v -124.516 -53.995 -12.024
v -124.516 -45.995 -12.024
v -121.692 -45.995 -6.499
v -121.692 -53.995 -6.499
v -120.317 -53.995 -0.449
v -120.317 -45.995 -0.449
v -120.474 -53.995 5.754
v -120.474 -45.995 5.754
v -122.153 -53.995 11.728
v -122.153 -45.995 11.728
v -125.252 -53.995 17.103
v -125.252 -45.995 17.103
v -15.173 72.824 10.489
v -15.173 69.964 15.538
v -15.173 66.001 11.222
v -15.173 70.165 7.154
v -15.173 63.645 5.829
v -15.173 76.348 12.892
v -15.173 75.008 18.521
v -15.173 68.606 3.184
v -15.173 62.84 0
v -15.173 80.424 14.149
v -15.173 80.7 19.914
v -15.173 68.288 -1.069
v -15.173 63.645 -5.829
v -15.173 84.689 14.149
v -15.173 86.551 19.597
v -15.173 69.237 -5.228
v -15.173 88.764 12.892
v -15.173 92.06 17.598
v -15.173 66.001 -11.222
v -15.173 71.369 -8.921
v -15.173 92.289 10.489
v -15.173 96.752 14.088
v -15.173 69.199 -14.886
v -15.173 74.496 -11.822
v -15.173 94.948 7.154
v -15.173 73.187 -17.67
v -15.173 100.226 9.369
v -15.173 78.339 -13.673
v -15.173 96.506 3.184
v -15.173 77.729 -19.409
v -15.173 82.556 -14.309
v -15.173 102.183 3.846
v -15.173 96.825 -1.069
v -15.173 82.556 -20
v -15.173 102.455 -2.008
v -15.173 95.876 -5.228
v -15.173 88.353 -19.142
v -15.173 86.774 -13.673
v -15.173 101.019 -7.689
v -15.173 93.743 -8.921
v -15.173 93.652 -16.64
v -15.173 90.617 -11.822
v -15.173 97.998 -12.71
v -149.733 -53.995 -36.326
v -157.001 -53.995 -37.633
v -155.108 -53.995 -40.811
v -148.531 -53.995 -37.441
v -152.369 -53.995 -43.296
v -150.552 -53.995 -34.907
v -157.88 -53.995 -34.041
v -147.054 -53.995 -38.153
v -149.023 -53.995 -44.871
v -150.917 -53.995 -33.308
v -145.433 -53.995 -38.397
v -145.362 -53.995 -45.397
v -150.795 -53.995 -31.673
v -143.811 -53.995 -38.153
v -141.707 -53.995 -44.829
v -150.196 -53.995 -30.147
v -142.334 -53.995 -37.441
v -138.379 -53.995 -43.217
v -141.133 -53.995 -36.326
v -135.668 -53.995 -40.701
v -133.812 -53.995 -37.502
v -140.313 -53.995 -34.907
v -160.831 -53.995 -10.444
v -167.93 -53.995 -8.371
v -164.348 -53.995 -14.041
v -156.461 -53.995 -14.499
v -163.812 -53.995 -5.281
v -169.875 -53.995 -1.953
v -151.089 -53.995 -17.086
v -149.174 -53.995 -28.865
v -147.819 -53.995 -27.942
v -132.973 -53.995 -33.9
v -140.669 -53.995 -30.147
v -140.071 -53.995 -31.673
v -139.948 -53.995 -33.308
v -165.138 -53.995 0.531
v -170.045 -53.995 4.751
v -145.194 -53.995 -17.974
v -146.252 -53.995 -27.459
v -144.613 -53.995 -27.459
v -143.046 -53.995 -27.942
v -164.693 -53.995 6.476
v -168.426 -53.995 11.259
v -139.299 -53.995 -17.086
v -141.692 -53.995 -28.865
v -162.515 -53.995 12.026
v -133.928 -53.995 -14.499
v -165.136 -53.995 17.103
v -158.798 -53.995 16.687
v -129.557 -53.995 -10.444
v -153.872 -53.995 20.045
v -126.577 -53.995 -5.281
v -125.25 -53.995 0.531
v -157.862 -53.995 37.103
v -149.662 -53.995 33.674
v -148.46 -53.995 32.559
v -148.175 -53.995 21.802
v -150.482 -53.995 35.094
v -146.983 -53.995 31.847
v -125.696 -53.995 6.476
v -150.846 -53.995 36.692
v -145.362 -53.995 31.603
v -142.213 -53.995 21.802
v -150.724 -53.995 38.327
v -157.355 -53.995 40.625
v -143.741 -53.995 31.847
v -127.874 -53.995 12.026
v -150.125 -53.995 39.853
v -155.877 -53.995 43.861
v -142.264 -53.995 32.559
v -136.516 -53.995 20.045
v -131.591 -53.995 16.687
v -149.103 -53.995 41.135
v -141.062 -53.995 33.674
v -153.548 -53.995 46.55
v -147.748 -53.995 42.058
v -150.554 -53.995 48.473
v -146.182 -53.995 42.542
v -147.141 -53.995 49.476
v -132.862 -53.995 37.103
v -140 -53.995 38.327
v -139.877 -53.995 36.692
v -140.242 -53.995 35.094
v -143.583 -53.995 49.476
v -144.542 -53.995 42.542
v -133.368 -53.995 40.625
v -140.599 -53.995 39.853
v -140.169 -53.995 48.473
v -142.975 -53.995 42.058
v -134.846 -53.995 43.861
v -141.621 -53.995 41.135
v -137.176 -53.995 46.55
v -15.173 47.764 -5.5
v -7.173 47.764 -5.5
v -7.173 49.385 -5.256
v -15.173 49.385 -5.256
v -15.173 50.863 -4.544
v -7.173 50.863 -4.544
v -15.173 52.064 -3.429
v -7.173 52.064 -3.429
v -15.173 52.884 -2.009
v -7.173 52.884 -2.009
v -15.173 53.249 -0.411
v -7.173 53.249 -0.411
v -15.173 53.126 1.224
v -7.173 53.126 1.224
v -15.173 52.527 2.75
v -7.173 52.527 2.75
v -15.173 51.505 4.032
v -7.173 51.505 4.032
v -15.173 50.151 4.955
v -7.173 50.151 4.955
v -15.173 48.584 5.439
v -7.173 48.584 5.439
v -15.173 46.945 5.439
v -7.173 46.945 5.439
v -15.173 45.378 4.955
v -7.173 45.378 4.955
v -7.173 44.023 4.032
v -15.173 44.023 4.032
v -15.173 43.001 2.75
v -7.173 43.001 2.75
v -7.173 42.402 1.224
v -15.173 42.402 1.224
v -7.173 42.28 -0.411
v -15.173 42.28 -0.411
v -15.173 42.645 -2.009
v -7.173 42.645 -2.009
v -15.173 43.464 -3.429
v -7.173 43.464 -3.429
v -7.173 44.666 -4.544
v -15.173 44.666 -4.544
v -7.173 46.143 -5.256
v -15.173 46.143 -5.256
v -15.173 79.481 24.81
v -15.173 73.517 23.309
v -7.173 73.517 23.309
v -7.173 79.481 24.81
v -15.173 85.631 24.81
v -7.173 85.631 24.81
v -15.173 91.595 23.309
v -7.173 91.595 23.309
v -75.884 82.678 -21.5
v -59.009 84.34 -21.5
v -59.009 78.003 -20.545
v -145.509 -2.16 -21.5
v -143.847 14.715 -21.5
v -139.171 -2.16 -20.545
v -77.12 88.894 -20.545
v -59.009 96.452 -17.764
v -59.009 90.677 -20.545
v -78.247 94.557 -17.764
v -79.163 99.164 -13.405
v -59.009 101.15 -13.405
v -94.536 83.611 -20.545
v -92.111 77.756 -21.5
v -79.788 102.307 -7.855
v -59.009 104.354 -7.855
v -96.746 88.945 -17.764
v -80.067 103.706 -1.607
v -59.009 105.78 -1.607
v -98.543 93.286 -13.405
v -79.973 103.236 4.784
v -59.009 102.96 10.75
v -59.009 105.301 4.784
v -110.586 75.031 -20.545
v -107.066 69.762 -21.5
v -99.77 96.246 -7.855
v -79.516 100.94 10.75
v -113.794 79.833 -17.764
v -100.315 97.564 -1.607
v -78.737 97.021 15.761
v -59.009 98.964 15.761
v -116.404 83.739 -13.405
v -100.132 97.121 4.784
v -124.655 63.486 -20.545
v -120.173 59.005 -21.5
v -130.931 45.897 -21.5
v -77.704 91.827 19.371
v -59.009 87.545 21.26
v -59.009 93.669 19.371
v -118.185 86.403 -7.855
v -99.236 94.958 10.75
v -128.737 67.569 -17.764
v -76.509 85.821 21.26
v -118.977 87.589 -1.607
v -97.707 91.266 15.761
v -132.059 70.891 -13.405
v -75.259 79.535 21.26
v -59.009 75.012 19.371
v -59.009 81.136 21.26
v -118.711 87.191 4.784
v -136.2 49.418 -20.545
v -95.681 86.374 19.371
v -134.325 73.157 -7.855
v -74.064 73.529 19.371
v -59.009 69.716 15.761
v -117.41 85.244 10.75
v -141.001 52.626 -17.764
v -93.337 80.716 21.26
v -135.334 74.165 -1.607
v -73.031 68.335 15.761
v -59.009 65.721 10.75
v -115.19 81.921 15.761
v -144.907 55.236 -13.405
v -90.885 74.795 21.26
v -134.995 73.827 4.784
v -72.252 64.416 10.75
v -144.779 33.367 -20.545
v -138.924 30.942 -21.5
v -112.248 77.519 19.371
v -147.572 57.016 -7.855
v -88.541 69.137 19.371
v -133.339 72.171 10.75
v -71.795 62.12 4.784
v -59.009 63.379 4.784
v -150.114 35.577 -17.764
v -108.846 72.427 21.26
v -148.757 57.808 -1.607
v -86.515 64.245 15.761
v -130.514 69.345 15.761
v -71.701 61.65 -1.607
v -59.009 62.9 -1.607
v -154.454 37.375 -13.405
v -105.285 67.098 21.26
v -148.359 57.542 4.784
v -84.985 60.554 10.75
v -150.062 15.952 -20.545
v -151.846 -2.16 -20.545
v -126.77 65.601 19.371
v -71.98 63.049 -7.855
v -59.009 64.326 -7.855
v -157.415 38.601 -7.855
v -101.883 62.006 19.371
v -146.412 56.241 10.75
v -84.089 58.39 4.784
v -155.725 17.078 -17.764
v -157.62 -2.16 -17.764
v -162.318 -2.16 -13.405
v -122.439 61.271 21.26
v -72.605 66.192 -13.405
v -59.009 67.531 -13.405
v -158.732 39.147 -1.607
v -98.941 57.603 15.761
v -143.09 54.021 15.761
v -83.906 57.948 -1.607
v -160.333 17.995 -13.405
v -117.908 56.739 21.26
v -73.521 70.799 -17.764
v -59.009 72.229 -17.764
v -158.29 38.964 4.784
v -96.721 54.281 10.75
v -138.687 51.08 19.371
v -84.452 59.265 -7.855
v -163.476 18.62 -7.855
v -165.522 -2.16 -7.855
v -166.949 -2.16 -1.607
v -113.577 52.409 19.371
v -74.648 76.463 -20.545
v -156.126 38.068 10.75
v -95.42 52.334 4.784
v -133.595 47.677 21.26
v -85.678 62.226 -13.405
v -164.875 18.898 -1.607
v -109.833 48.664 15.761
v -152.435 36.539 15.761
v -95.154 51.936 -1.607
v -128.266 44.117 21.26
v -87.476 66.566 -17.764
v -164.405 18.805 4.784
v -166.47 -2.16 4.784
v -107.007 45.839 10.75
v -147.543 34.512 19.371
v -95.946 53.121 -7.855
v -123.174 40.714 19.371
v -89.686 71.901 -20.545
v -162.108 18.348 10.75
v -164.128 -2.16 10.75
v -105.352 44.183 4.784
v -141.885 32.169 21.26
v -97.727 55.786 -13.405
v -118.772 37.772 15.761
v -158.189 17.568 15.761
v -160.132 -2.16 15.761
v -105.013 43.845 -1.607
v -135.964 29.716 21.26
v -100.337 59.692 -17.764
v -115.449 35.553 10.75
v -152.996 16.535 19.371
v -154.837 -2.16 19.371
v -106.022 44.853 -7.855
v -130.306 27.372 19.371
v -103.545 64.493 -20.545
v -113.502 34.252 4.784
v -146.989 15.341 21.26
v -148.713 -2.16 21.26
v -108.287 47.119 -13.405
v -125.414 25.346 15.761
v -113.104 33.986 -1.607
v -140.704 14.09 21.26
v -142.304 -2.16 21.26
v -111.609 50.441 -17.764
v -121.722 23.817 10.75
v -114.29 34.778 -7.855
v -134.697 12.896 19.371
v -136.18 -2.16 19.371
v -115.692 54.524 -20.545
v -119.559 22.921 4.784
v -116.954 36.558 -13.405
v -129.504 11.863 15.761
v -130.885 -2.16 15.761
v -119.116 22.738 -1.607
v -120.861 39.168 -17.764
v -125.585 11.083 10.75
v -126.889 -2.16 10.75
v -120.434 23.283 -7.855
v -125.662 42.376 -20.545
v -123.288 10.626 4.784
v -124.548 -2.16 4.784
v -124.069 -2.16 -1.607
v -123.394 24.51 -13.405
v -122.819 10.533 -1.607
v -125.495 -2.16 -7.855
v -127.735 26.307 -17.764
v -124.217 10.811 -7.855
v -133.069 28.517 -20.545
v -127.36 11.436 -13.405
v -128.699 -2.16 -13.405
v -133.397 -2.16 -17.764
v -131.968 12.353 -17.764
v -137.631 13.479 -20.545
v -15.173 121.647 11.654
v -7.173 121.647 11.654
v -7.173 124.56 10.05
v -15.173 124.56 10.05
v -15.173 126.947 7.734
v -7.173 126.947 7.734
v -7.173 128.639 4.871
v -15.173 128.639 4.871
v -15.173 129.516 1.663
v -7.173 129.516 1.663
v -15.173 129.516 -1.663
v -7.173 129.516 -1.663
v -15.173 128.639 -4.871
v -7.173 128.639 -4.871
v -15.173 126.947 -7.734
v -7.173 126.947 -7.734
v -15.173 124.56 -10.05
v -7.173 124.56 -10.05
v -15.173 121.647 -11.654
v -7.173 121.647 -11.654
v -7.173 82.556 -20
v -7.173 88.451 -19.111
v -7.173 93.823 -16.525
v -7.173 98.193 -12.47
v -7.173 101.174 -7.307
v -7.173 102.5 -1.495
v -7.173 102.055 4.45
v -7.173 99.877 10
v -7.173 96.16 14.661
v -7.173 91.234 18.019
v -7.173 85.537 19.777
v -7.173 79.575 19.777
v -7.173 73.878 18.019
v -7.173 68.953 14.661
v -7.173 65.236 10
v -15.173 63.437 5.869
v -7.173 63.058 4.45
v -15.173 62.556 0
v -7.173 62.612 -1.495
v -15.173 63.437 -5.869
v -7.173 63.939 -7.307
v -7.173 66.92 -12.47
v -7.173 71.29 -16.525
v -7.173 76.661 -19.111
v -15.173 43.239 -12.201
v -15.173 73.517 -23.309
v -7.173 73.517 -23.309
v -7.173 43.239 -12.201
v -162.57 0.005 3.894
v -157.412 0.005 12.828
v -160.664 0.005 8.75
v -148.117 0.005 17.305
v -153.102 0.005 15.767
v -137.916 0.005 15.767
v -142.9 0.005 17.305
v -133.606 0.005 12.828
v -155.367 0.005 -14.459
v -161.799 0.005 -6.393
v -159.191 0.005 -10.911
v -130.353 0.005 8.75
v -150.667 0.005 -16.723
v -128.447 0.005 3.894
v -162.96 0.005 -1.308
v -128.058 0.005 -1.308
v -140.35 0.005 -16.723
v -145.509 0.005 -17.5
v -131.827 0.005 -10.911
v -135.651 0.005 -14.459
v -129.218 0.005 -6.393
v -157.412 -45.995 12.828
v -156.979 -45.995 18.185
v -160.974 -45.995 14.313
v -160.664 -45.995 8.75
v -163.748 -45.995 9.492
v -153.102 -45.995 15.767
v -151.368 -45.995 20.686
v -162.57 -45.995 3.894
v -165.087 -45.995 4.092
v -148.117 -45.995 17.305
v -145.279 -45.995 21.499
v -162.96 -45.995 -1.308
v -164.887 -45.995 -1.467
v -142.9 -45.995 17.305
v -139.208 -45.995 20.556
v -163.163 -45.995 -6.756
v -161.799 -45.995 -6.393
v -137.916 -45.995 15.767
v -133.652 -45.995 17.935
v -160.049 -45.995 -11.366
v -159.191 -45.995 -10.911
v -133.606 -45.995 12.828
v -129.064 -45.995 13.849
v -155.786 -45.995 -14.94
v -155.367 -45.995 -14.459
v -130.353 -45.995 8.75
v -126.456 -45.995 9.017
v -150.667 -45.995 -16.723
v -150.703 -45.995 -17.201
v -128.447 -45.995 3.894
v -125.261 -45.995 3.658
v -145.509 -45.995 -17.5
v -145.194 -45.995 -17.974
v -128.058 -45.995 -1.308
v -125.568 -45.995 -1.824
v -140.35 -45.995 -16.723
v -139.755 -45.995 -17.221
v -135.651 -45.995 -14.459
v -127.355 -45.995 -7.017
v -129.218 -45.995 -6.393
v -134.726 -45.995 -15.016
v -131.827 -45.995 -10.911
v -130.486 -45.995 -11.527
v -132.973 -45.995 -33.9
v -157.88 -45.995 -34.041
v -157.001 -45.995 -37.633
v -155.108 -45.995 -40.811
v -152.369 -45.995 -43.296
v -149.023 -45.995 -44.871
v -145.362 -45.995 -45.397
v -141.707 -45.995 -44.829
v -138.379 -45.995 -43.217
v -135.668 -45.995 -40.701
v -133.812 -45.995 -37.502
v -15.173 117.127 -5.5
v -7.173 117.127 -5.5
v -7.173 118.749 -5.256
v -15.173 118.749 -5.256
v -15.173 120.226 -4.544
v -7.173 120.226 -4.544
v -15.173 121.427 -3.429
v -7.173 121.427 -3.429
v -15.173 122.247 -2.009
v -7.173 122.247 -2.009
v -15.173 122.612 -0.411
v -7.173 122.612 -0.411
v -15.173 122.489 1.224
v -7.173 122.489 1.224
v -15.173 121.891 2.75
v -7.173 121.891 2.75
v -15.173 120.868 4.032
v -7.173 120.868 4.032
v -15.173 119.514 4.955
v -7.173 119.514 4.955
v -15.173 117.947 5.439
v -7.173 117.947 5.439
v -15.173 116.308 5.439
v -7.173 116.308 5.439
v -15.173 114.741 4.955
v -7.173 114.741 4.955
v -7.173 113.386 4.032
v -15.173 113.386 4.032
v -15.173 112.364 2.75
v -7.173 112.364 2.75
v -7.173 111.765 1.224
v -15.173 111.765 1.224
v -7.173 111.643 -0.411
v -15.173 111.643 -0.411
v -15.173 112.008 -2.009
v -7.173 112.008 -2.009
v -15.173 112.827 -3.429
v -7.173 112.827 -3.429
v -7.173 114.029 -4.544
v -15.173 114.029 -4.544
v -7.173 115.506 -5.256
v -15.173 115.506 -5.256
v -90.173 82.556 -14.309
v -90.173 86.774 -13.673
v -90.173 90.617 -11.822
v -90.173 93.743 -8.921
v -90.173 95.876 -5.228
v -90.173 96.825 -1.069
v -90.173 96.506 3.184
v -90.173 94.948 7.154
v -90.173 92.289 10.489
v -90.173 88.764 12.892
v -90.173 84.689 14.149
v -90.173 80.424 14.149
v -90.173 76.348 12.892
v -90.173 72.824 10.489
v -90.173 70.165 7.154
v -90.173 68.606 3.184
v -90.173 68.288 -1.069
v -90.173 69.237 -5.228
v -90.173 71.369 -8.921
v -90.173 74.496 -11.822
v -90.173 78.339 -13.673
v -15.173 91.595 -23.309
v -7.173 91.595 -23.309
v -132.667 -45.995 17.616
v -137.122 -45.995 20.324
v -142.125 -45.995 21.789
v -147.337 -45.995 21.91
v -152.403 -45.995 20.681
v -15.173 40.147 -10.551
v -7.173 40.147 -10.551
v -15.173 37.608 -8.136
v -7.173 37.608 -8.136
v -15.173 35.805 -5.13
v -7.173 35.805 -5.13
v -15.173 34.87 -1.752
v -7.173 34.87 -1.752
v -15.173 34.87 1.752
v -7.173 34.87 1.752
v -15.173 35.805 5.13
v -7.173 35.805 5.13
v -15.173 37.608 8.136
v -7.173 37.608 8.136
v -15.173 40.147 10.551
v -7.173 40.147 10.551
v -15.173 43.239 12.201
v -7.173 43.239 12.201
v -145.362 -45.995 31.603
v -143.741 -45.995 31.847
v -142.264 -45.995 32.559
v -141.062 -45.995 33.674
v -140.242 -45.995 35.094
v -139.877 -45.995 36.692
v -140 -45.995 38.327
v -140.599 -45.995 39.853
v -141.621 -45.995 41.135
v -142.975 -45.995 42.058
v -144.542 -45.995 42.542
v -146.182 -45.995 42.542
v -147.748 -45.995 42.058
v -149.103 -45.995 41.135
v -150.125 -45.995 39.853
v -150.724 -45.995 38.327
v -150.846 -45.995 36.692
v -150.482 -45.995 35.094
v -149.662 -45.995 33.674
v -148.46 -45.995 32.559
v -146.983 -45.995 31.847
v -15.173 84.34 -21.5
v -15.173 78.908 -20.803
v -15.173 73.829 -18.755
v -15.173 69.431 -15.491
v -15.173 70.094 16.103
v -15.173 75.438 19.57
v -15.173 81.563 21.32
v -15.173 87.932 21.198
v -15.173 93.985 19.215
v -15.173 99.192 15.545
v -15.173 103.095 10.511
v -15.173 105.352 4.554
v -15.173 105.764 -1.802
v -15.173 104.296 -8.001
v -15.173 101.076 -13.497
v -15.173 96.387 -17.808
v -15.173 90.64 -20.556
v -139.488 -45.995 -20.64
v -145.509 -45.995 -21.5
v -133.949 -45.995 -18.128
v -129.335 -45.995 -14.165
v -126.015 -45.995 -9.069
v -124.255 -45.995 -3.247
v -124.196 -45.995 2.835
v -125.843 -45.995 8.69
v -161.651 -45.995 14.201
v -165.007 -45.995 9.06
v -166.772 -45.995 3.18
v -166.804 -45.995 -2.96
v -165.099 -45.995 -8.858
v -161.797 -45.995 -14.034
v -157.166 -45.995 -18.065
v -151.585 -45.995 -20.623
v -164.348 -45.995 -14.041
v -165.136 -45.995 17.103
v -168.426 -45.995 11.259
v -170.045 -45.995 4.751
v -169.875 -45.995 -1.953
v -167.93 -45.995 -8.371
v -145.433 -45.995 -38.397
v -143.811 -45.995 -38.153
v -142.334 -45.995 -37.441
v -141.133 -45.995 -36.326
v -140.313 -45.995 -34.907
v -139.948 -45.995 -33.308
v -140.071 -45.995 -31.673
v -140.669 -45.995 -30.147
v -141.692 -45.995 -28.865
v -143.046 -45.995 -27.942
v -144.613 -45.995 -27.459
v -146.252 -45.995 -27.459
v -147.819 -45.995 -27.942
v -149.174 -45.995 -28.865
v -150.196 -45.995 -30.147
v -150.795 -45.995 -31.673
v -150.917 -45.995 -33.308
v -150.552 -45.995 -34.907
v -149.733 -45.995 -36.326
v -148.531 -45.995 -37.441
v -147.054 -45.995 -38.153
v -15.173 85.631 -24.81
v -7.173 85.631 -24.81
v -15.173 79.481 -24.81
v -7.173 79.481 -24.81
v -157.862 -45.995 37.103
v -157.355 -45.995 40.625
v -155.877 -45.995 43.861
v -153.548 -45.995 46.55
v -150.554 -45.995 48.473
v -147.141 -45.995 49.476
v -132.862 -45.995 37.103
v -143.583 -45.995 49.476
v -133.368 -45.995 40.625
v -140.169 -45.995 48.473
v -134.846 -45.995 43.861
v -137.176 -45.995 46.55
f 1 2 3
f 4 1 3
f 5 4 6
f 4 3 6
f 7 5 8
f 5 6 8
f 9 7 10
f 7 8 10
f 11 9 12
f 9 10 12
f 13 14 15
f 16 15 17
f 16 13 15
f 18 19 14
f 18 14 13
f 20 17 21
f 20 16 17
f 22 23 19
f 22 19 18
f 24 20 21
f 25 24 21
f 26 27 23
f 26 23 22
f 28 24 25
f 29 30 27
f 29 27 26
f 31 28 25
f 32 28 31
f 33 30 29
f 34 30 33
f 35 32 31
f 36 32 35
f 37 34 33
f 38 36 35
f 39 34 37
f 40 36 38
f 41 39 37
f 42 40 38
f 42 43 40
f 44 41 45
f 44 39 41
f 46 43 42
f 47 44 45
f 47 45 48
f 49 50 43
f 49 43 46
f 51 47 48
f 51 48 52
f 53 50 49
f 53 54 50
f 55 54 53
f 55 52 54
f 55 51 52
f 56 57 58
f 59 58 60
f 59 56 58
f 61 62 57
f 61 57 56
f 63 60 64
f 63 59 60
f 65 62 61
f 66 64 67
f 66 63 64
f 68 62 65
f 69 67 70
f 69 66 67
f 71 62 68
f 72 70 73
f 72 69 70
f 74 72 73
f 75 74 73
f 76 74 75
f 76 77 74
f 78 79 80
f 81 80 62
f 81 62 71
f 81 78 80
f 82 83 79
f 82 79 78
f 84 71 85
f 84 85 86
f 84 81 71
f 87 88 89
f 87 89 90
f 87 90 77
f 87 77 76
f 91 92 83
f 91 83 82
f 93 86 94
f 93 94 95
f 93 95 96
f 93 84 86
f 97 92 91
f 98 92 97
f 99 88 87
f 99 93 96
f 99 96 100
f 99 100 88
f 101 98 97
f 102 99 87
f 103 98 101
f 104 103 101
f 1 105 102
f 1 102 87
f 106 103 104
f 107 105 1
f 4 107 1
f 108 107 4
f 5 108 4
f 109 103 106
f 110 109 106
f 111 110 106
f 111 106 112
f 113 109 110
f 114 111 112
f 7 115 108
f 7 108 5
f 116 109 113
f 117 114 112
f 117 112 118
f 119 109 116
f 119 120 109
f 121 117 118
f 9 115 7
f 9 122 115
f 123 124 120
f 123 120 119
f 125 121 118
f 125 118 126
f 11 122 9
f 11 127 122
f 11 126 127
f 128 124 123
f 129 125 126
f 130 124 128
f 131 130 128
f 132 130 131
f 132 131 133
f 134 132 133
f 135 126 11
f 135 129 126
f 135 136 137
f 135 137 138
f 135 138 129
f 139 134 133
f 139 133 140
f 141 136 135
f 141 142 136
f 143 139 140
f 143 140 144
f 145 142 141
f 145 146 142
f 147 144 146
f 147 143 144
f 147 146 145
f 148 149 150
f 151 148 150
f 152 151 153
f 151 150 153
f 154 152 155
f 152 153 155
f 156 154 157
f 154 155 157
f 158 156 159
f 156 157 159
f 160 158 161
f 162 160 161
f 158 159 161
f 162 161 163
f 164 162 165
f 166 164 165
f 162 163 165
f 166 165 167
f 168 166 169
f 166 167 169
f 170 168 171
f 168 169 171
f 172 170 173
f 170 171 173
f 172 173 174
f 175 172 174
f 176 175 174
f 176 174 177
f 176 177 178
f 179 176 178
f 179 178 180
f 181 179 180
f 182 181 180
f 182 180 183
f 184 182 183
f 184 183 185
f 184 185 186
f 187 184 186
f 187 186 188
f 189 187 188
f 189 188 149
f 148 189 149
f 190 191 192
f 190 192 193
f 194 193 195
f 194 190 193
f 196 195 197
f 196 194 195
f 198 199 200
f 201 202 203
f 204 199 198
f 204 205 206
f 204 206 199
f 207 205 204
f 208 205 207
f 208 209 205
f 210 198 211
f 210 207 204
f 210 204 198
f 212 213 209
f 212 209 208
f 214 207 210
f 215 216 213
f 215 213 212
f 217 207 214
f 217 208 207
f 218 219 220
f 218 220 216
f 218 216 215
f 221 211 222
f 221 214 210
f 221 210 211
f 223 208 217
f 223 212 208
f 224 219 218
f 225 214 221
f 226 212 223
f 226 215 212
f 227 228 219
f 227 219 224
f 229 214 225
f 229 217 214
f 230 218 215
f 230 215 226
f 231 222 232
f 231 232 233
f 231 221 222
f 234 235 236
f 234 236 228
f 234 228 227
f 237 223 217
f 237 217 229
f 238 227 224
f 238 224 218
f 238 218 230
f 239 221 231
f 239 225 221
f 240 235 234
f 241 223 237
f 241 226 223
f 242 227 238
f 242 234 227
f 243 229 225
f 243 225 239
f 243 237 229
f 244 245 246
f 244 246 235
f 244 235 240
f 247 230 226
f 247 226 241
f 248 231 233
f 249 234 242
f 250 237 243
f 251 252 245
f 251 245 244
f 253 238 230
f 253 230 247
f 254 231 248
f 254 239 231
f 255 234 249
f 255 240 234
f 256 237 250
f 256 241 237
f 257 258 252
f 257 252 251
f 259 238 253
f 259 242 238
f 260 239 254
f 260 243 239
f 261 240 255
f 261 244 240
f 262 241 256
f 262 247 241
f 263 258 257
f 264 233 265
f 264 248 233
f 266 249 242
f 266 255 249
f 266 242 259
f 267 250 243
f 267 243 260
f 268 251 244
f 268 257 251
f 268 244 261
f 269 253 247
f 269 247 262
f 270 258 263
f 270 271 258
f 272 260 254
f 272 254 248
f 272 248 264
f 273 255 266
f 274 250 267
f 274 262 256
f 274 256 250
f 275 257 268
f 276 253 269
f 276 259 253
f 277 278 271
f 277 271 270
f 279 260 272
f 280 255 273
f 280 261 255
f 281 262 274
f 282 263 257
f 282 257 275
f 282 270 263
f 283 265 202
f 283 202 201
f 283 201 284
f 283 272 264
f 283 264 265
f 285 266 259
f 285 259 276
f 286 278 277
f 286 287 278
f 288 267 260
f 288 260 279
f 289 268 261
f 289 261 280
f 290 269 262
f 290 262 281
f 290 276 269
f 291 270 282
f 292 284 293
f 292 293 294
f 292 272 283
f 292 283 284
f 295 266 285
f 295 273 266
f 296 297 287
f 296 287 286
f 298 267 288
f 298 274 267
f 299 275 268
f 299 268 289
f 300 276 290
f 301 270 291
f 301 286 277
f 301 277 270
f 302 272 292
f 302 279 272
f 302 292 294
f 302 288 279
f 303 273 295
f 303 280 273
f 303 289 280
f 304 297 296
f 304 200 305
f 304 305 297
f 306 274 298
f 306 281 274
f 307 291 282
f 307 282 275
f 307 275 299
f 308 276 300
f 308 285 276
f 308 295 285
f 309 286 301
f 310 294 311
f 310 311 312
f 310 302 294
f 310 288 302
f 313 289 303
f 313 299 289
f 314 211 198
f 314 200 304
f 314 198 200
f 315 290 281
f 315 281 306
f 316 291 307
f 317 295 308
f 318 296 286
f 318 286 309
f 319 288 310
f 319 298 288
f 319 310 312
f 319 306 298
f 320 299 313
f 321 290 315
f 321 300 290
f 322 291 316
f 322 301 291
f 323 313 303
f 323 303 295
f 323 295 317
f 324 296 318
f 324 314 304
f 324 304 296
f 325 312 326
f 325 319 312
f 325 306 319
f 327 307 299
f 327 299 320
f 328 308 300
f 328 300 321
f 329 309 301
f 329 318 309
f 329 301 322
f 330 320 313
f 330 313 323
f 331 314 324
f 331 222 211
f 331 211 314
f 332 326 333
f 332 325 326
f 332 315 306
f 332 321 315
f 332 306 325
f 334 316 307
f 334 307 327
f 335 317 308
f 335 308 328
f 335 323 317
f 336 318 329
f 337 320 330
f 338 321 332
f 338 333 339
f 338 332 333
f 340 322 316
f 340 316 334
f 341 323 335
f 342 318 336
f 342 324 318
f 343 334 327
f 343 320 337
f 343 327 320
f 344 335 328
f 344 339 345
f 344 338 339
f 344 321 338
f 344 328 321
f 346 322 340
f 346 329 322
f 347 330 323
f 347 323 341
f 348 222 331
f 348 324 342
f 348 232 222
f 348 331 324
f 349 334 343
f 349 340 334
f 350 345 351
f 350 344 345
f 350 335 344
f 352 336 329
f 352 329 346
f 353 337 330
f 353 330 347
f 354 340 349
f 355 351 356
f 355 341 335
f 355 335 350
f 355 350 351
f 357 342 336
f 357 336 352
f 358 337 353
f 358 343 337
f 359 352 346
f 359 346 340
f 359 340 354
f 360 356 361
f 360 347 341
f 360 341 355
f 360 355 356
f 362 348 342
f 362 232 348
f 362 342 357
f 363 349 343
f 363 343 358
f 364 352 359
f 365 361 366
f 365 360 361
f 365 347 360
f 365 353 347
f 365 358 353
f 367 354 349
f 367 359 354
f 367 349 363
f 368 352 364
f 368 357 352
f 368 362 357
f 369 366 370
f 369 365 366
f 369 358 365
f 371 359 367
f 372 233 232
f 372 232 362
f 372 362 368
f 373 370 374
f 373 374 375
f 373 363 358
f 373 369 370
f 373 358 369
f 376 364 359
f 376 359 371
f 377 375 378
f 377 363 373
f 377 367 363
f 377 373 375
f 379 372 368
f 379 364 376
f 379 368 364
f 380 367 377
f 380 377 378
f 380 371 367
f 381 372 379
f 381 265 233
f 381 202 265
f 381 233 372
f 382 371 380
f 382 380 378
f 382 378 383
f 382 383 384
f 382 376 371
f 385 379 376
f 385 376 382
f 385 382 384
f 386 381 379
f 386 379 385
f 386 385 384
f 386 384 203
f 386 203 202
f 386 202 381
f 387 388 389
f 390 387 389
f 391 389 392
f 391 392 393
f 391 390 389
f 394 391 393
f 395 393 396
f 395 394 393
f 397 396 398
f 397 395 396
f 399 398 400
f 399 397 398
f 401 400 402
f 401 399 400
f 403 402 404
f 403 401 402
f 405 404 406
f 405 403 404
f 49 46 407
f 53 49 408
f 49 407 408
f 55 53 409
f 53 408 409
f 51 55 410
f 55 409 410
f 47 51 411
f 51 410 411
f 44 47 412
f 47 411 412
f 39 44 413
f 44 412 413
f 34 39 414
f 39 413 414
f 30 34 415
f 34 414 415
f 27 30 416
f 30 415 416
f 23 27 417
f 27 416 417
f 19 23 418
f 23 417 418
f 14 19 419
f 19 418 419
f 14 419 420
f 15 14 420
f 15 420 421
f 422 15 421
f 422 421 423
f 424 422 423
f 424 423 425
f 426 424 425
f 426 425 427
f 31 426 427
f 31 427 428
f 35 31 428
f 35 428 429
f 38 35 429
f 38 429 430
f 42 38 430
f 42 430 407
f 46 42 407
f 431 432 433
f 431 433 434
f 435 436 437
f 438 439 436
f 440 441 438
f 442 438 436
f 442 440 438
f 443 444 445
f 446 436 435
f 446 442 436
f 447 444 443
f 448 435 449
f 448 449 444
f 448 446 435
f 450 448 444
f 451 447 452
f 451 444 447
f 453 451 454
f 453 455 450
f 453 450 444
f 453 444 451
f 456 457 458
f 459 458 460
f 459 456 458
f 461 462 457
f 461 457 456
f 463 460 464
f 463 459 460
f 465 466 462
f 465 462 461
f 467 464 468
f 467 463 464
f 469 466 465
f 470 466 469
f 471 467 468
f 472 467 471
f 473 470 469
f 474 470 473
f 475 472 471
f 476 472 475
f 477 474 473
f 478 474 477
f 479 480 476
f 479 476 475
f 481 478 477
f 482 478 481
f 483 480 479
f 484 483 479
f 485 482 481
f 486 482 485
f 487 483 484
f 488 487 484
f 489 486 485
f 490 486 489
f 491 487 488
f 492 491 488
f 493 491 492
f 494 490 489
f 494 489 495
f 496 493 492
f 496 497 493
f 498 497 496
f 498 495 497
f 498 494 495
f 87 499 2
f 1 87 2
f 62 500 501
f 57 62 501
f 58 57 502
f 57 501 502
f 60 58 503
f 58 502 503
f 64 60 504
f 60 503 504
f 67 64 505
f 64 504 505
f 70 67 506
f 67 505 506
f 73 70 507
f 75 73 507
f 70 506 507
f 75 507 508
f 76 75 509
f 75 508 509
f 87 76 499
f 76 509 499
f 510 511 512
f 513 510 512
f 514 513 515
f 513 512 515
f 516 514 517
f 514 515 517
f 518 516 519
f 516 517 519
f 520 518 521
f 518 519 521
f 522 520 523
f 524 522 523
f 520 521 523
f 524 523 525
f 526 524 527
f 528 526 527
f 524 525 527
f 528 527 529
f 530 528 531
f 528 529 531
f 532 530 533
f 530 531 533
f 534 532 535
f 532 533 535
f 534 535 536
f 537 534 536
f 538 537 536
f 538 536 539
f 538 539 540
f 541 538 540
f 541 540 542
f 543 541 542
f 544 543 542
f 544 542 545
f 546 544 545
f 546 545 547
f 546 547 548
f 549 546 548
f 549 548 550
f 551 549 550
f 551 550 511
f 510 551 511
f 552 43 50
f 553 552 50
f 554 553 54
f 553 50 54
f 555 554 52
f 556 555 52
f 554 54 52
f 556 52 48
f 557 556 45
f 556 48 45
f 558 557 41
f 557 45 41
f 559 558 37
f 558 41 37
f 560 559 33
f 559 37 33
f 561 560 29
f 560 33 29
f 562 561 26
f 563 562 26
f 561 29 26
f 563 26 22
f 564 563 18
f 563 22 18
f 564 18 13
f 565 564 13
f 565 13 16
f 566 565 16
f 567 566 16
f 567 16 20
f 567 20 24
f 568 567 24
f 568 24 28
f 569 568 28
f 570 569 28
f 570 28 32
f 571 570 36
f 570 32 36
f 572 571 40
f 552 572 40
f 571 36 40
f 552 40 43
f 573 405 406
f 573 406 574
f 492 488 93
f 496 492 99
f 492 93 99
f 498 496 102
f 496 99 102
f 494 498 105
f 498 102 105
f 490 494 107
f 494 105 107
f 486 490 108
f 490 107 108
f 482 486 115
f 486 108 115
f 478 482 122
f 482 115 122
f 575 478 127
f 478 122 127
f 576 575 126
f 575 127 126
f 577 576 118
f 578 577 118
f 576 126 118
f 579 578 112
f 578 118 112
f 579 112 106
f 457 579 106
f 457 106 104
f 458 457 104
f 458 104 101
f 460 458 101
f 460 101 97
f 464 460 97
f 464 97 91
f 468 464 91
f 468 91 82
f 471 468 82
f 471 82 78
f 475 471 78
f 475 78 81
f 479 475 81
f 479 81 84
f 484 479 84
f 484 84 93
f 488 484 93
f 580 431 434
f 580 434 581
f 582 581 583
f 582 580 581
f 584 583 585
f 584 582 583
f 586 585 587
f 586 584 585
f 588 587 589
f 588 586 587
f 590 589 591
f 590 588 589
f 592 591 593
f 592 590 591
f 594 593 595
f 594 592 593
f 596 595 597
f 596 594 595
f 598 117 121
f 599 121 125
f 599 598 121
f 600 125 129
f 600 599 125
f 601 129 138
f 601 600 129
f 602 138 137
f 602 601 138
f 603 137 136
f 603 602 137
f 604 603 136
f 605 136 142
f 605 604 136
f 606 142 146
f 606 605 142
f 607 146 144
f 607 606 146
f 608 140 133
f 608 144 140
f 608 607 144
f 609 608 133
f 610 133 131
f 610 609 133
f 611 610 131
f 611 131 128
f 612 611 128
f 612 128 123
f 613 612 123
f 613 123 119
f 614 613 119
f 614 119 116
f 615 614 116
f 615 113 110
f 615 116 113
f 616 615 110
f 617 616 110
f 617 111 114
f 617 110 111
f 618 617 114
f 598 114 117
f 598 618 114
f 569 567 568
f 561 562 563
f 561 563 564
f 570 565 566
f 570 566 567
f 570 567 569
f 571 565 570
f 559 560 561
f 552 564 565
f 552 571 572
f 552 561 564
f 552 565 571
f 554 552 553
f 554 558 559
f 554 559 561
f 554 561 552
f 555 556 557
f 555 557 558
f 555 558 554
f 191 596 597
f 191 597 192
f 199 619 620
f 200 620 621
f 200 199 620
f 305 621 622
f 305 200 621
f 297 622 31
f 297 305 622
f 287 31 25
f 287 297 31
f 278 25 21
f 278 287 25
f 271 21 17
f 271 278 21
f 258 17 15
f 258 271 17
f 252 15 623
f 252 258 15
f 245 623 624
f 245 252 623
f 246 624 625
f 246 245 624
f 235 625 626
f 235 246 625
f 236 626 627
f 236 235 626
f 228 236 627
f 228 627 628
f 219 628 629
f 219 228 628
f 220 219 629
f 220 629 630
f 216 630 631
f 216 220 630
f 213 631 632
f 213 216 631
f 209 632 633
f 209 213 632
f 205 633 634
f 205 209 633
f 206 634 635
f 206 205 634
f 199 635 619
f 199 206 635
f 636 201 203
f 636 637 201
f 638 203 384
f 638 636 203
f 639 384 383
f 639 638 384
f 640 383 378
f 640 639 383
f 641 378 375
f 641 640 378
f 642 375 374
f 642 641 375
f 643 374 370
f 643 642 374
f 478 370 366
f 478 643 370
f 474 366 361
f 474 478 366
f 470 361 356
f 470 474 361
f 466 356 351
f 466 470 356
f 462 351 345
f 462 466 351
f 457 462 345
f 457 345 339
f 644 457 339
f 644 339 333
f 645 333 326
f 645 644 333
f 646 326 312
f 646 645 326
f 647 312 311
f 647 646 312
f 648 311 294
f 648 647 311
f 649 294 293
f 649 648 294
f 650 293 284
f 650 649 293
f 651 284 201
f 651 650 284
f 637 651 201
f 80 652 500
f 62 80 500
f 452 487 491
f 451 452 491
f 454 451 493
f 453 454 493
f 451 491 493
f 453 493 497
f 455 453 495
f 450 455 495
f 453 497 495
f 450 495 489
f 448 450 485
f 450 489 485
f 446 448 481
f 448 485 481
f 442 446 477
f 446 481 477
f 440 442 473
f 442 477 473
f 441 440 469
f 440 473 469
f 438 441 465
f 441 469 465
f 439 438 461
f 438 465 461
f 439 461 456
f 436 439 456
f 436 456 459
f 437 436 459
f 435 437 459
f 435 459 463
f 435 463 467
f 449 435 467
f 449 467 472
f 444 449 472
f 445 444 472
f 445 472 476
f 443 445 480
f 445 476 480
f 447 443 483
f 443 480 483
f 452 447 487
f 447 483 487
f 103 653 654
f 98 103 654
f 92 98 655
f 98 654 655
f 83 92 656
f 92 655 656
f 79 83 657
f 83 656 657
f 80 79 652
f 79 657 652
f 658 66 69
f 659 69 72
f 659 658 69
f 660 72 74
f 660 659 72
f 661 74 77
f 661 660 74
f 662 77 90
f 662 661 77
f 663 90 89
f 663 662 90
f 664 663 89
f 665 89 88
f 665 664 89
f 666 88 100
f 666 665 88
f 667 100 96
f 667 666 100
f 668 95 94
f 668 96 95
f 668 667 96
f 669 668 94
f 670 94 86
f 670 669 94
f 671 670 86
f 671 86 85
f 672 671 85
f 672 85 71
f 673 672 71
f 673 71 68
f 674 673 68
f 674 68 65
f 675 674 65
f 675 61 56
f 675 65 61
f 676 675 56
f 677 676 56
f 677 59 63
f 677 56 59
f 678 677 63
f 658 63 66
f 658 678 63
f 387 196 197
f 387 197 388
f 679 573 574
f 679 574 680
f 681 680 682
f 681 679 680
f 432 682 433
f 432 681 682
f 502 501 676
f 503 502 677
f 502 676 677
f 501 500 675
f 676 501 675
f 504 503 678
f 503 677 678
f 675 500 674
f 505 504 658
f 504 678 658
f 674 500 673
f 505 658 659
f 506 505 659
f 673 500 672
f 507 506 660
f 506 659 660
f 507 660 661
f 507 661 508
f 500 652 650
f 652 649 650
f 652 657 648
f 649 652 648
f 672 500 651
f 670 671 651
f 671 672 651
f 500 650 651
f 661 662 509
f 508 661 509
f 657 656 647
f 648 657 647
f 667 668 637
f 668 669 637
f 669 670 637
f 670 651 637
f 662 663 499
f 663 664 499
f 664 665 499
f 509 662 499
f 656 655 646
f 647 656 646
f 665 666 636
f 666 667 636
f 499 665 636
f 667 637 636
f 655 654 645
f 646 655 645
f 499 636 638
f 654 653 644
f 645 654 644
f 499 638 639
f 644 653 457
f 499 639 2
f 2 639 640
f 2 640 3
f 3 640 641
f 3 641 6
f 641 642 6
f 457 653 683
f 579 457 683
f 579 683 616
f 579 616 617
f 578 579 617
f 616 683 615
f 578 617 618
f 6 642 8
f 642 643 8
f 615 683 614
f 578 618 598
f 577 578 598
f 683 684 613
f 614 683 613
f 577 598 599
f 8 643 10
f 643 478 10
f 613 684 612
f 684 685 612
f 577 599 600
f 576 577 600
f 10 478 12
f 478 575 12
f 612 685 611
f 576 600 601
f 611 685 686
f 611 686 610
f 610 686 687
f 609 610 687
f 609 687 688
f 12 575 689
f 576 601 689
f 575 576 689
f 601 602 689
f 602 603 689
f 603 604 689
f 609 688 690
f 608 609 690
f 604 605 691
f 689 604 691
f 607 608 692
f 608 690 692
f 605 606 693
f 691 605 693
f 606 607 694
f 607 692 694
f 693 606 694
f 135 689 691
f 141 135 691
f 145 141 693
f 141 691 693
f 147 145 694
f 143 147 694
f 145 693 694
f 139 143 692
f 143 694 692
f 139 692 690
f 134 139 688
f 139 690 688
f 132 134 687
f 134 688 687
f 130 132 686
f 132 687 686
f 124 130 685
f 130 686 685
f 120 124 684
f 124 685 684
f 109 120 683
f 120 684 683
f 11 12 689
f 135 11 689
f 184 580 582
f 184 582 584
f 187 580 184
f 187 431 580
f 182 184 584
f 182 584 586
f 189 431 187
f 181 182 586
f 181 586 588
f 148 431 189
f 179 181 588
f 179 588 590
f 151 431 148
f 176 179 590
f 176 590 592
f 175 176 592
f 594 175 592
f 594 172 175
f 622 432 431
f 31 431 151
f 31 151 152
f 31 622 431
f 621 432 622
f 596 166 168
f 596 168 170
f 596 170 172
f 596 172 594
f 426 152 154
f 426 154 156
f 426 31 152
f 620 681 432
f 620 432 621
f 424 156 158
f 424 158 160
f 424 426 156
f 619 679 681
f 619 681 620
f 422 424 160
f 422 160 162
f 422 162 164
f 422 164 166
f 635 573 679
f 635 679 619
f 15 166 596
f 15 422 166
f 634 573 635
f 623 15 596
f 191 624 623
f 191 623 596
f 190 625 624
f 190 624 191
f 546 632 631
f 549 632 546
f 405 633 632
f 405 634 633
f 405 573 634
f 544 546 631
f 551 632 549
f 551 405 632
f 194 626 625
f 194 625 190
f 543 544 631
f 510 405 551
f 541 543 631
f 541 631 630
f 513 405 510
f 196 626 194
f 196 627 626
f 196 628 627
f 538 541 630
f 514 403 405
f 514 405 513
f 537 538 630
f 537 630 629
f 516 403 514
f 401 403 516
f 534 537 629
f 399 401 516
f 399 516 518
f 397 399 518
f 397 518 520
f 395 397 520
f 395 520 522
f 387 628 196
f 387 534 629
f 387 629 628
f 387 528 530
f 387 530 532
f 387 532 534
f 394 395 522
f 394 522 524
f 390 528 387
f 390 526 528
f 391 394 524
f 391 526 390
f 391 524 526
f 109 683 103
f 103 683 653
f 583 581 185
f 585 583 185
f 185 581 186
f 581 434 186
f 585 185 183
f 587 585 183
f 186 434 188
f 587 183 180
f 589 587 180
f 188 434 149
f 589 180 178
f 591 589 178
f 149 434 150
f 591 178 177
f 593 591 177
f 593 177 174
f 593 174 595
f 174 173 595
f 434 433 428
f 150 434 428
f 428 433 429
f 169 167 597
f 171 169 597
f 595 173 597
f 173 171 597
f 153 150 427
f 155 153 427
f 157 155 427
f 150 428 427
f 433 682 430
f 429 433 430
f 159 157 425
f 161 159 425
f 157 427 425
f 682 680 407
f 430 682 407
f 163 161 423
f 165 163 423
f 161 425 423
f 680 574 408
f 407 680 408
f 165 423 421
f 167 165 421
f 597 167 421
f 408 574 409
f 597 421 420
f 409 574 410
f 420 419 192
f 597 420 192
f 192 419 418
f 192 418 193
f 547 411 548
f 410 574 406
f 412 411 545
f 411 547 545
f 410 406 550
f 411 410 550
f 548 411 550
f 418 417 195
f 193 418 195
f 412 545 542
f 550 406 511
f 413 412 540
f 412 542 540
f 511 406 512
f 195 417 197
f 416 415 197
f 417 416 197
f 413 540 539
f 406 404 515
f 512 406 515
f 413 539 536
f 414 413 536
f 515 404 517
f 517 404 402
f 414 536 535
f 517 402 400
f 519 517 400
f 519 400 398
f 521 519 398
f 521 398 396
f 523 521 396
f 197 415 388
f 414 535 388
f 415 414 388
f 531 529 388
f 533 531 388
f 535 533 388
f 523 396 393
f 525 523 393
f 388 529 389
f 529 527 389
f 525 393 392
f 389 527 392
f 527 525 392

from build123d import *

# Parameters (mm, degrees)
SWEEP1_PROFILE_R    = 21.5
BOSS_EXTRUDE1_DEPTH = 8
BOSS_EXTRUDE2_DEPTH = 8
SKETCH10_R          = 20
CUT_EXTRUDE1_DEPTH  = 8
SKETCH12_R          = 20
CUT_EXTRUDE2_DEPTH  = 8
SKETCH13_R          = 5.5
CUT_EXTRUDE3_DEPTH  = 22
SKETCH14_R          = 5.5
CUT_EXTRUDE4_DEPTH  = 22
SKETCH26_R          = 14.308639319
CUT_EXTRUDE6_DEPTH  = 75
SKETCH27_R          = 17.5
CUT_EXTRUDE8_DEPTH  = 46


with BuildPart() as part:
    # Sweep1: sweep along a path in Sketch1
    with BuildLine(Plane.XY) as sweep1_path:
        Line((-15.173427297, 84.340140469), (-59.008690724, 84.340140469))
        ThreePointArc((-59.008690724, 84.340140469), (-120.173427297, 59.004877041), (-145.508690724, -2.159859531))
        Line((-145.508690724, -2.159859531), (-145.508690724, -45.995122959))
    # Sweep1 profile (on start of the path) → Sweep1 (sweep)
    with BuildSketch(Plane(origin=(-15.173427297, 84.340140469, 0), x_dir=(0, 0, -1), z_dir=(-1, 0, 0))):
        Circle(SWEEP1_PROFILE_R)
    sweep(path=sweep1_path.line)

    # Sketch8 → Boss-Extrude1 (add)
    with BuildSketch(Plane(origin=(-15.173427297, 0, 0), x_dir=(0, 0, -1), z_dir=(1, 0, 0))):
        with BuildLine():
            Line((11.654299247, 121.647035289), (23.308607816, 91.595469986))
            ThreePointArc((23.308607816, 91.595469986), (25.000007686, 82.556156629), (23.308607816, 73.516843272))
            Line((23.308607816, 73.516843272), (12.201254362, 43.23933866))
            ThreePointArc((12.201254362, 43.23933866), (0, 34.751015799), (-12.201254362, 43.23933866))
            Line((-12.201254362, 43.23933866), (-23.308607816, 73.516843272))
            ThreePointArc((-23.308607816, 73.516843272), (-25.000007686, 82.556156629), (-23.308607816, 91.595469986))
            Line((-23.308607816, 91.595469986), (-11.654299247, 121.647035289))
            ThreePointArc((-11.654299247, 121.647035289), (0, 129.627377221), (11.654299247, 121.647035289))
        make_face()
    extrude(amount=BOSS_EXTRUDE1_DEPTH)

    # Sketch9 → Boss-Extrude2 (add)
    with BuildSketch(Plane.XZ.offset(45.995122959)):
        with BuildLine():
            Line((-157.861790456, 37.103058549), (-165.135770102, 17.103058549))
            ThreePointArc((-165.135770102, 17.103058549), (-170.186132718, 1.393320876), (-164.347898171, -14.040960373))
            Line((-164.347898171, -14.040960373), (-157.880174747, -34.040960373))
            ThreePointArc((-157.880174747, -34.040960373), (-145.361790456, -45.396941451), (-132.972897727, -33.899829272))
            Line((-132.972897727, -33.899829272), (-124.515630897, -12.02434059))
            ThreePointArc((-124.515630897, -12.02434059), (-120.202124379, 2.657801138), (-125.252486994, 17.103058549))
            Line((-125.252486994, 17.103058549), (-132.861790456, 37.103058549))
            ThreePointArc((-132.861790456, 37.103058549), (-145.361790456, 49.603058549), (-157.861790456, 37.103058549))
        make_face()
    extrude(amount=BOSS_EXTRUDE2_DEPTH)

    # Sketch10 → Cut-Extrude1 (cut)
    with BuildSketch(Plane(origin=(-7.173427297, 0, 0), x_dir=(0, 0, -1), z_dir=(1, 0, 0))):
        with Locations((0, 82.556156629)):
            Circle(SKETCH10_R)
    extrude(amount=-CUT_EXTRUDE1_DEPTH, mode=Mode.SUBTRACT)

    # Sketch12 → Cut-Extrude2 (cut)
    with BuildSketch(Plane.XZ.offset(53.995122959)):
        with Locations(Location((-145.194128548, 2.025561007, 0), (0, 0, 270))):
            Circle(SKETCH12_R)
    extrude(amount=-CUT_EXTRUDE2_DEPTH, mode=Mode.SUBTRACT)

    # Sketch13 → Cut-Extrude3 (cut)
    with BuildSketch(Plane.XZ.offset(45.995122959)):
        with Locations(Location((-145.361790456, 37.103058549, 0), (0, 0, 270))):
            Circle(SKETCH13_R)
        with Locations(Location((-145.432617565, -32.897142112, 0), (0, 0, 270))):
            Circle(SKETCH13_R)
    extrude(amount=CUT_EXTRUDE3_DEPTH, mode=Mode.SUBTRACT)

    # Sketch14 → Cut-Extrude4 (cut)
    with BuildSketch(Plane(origin=(-7.173427297, 0, 0), x_dir=(0, 0, -1), z_dir=(1, 0, 0))):
        with Locations((0, 117.127377221)):
            Circle(SKETCH14_R)
        with Locations((0, 47.764318698)):
            Circle(SKETCH14_R)
    extrude(amount=-CUT_EXTRUDE4_DEPTH, mode=Mode.SUBTRACT)

    # Sketch26 → Cut-Extrude6 (cut)
    with BuildSketch(Plane(origin=(-15.173427297, 0, 0), x_dir=(0, 0, -1), z_dir=(1, 0, 0))):
        with Locations((0, 82.556156629)):
            Circle(SKETCH26_R)
    extrude(amount=-CUT_EXTRUDE6_DEPTH, mode=Mode.SUBTRACT)

    # Sketch27 → Cut-Extrude8 (cut)
    with BuildSketch(Plane.XZ.offset(45.995122959)):
        with Locations(Location((-145.508690724, 0, 0), (0, 0, 270))):
            Circle(SKETCH27_R)
    extrude(amount=-CUT_EXTRUDE8_DEPTH, mode=Mode.SUBTRACT)


solid = part.part
